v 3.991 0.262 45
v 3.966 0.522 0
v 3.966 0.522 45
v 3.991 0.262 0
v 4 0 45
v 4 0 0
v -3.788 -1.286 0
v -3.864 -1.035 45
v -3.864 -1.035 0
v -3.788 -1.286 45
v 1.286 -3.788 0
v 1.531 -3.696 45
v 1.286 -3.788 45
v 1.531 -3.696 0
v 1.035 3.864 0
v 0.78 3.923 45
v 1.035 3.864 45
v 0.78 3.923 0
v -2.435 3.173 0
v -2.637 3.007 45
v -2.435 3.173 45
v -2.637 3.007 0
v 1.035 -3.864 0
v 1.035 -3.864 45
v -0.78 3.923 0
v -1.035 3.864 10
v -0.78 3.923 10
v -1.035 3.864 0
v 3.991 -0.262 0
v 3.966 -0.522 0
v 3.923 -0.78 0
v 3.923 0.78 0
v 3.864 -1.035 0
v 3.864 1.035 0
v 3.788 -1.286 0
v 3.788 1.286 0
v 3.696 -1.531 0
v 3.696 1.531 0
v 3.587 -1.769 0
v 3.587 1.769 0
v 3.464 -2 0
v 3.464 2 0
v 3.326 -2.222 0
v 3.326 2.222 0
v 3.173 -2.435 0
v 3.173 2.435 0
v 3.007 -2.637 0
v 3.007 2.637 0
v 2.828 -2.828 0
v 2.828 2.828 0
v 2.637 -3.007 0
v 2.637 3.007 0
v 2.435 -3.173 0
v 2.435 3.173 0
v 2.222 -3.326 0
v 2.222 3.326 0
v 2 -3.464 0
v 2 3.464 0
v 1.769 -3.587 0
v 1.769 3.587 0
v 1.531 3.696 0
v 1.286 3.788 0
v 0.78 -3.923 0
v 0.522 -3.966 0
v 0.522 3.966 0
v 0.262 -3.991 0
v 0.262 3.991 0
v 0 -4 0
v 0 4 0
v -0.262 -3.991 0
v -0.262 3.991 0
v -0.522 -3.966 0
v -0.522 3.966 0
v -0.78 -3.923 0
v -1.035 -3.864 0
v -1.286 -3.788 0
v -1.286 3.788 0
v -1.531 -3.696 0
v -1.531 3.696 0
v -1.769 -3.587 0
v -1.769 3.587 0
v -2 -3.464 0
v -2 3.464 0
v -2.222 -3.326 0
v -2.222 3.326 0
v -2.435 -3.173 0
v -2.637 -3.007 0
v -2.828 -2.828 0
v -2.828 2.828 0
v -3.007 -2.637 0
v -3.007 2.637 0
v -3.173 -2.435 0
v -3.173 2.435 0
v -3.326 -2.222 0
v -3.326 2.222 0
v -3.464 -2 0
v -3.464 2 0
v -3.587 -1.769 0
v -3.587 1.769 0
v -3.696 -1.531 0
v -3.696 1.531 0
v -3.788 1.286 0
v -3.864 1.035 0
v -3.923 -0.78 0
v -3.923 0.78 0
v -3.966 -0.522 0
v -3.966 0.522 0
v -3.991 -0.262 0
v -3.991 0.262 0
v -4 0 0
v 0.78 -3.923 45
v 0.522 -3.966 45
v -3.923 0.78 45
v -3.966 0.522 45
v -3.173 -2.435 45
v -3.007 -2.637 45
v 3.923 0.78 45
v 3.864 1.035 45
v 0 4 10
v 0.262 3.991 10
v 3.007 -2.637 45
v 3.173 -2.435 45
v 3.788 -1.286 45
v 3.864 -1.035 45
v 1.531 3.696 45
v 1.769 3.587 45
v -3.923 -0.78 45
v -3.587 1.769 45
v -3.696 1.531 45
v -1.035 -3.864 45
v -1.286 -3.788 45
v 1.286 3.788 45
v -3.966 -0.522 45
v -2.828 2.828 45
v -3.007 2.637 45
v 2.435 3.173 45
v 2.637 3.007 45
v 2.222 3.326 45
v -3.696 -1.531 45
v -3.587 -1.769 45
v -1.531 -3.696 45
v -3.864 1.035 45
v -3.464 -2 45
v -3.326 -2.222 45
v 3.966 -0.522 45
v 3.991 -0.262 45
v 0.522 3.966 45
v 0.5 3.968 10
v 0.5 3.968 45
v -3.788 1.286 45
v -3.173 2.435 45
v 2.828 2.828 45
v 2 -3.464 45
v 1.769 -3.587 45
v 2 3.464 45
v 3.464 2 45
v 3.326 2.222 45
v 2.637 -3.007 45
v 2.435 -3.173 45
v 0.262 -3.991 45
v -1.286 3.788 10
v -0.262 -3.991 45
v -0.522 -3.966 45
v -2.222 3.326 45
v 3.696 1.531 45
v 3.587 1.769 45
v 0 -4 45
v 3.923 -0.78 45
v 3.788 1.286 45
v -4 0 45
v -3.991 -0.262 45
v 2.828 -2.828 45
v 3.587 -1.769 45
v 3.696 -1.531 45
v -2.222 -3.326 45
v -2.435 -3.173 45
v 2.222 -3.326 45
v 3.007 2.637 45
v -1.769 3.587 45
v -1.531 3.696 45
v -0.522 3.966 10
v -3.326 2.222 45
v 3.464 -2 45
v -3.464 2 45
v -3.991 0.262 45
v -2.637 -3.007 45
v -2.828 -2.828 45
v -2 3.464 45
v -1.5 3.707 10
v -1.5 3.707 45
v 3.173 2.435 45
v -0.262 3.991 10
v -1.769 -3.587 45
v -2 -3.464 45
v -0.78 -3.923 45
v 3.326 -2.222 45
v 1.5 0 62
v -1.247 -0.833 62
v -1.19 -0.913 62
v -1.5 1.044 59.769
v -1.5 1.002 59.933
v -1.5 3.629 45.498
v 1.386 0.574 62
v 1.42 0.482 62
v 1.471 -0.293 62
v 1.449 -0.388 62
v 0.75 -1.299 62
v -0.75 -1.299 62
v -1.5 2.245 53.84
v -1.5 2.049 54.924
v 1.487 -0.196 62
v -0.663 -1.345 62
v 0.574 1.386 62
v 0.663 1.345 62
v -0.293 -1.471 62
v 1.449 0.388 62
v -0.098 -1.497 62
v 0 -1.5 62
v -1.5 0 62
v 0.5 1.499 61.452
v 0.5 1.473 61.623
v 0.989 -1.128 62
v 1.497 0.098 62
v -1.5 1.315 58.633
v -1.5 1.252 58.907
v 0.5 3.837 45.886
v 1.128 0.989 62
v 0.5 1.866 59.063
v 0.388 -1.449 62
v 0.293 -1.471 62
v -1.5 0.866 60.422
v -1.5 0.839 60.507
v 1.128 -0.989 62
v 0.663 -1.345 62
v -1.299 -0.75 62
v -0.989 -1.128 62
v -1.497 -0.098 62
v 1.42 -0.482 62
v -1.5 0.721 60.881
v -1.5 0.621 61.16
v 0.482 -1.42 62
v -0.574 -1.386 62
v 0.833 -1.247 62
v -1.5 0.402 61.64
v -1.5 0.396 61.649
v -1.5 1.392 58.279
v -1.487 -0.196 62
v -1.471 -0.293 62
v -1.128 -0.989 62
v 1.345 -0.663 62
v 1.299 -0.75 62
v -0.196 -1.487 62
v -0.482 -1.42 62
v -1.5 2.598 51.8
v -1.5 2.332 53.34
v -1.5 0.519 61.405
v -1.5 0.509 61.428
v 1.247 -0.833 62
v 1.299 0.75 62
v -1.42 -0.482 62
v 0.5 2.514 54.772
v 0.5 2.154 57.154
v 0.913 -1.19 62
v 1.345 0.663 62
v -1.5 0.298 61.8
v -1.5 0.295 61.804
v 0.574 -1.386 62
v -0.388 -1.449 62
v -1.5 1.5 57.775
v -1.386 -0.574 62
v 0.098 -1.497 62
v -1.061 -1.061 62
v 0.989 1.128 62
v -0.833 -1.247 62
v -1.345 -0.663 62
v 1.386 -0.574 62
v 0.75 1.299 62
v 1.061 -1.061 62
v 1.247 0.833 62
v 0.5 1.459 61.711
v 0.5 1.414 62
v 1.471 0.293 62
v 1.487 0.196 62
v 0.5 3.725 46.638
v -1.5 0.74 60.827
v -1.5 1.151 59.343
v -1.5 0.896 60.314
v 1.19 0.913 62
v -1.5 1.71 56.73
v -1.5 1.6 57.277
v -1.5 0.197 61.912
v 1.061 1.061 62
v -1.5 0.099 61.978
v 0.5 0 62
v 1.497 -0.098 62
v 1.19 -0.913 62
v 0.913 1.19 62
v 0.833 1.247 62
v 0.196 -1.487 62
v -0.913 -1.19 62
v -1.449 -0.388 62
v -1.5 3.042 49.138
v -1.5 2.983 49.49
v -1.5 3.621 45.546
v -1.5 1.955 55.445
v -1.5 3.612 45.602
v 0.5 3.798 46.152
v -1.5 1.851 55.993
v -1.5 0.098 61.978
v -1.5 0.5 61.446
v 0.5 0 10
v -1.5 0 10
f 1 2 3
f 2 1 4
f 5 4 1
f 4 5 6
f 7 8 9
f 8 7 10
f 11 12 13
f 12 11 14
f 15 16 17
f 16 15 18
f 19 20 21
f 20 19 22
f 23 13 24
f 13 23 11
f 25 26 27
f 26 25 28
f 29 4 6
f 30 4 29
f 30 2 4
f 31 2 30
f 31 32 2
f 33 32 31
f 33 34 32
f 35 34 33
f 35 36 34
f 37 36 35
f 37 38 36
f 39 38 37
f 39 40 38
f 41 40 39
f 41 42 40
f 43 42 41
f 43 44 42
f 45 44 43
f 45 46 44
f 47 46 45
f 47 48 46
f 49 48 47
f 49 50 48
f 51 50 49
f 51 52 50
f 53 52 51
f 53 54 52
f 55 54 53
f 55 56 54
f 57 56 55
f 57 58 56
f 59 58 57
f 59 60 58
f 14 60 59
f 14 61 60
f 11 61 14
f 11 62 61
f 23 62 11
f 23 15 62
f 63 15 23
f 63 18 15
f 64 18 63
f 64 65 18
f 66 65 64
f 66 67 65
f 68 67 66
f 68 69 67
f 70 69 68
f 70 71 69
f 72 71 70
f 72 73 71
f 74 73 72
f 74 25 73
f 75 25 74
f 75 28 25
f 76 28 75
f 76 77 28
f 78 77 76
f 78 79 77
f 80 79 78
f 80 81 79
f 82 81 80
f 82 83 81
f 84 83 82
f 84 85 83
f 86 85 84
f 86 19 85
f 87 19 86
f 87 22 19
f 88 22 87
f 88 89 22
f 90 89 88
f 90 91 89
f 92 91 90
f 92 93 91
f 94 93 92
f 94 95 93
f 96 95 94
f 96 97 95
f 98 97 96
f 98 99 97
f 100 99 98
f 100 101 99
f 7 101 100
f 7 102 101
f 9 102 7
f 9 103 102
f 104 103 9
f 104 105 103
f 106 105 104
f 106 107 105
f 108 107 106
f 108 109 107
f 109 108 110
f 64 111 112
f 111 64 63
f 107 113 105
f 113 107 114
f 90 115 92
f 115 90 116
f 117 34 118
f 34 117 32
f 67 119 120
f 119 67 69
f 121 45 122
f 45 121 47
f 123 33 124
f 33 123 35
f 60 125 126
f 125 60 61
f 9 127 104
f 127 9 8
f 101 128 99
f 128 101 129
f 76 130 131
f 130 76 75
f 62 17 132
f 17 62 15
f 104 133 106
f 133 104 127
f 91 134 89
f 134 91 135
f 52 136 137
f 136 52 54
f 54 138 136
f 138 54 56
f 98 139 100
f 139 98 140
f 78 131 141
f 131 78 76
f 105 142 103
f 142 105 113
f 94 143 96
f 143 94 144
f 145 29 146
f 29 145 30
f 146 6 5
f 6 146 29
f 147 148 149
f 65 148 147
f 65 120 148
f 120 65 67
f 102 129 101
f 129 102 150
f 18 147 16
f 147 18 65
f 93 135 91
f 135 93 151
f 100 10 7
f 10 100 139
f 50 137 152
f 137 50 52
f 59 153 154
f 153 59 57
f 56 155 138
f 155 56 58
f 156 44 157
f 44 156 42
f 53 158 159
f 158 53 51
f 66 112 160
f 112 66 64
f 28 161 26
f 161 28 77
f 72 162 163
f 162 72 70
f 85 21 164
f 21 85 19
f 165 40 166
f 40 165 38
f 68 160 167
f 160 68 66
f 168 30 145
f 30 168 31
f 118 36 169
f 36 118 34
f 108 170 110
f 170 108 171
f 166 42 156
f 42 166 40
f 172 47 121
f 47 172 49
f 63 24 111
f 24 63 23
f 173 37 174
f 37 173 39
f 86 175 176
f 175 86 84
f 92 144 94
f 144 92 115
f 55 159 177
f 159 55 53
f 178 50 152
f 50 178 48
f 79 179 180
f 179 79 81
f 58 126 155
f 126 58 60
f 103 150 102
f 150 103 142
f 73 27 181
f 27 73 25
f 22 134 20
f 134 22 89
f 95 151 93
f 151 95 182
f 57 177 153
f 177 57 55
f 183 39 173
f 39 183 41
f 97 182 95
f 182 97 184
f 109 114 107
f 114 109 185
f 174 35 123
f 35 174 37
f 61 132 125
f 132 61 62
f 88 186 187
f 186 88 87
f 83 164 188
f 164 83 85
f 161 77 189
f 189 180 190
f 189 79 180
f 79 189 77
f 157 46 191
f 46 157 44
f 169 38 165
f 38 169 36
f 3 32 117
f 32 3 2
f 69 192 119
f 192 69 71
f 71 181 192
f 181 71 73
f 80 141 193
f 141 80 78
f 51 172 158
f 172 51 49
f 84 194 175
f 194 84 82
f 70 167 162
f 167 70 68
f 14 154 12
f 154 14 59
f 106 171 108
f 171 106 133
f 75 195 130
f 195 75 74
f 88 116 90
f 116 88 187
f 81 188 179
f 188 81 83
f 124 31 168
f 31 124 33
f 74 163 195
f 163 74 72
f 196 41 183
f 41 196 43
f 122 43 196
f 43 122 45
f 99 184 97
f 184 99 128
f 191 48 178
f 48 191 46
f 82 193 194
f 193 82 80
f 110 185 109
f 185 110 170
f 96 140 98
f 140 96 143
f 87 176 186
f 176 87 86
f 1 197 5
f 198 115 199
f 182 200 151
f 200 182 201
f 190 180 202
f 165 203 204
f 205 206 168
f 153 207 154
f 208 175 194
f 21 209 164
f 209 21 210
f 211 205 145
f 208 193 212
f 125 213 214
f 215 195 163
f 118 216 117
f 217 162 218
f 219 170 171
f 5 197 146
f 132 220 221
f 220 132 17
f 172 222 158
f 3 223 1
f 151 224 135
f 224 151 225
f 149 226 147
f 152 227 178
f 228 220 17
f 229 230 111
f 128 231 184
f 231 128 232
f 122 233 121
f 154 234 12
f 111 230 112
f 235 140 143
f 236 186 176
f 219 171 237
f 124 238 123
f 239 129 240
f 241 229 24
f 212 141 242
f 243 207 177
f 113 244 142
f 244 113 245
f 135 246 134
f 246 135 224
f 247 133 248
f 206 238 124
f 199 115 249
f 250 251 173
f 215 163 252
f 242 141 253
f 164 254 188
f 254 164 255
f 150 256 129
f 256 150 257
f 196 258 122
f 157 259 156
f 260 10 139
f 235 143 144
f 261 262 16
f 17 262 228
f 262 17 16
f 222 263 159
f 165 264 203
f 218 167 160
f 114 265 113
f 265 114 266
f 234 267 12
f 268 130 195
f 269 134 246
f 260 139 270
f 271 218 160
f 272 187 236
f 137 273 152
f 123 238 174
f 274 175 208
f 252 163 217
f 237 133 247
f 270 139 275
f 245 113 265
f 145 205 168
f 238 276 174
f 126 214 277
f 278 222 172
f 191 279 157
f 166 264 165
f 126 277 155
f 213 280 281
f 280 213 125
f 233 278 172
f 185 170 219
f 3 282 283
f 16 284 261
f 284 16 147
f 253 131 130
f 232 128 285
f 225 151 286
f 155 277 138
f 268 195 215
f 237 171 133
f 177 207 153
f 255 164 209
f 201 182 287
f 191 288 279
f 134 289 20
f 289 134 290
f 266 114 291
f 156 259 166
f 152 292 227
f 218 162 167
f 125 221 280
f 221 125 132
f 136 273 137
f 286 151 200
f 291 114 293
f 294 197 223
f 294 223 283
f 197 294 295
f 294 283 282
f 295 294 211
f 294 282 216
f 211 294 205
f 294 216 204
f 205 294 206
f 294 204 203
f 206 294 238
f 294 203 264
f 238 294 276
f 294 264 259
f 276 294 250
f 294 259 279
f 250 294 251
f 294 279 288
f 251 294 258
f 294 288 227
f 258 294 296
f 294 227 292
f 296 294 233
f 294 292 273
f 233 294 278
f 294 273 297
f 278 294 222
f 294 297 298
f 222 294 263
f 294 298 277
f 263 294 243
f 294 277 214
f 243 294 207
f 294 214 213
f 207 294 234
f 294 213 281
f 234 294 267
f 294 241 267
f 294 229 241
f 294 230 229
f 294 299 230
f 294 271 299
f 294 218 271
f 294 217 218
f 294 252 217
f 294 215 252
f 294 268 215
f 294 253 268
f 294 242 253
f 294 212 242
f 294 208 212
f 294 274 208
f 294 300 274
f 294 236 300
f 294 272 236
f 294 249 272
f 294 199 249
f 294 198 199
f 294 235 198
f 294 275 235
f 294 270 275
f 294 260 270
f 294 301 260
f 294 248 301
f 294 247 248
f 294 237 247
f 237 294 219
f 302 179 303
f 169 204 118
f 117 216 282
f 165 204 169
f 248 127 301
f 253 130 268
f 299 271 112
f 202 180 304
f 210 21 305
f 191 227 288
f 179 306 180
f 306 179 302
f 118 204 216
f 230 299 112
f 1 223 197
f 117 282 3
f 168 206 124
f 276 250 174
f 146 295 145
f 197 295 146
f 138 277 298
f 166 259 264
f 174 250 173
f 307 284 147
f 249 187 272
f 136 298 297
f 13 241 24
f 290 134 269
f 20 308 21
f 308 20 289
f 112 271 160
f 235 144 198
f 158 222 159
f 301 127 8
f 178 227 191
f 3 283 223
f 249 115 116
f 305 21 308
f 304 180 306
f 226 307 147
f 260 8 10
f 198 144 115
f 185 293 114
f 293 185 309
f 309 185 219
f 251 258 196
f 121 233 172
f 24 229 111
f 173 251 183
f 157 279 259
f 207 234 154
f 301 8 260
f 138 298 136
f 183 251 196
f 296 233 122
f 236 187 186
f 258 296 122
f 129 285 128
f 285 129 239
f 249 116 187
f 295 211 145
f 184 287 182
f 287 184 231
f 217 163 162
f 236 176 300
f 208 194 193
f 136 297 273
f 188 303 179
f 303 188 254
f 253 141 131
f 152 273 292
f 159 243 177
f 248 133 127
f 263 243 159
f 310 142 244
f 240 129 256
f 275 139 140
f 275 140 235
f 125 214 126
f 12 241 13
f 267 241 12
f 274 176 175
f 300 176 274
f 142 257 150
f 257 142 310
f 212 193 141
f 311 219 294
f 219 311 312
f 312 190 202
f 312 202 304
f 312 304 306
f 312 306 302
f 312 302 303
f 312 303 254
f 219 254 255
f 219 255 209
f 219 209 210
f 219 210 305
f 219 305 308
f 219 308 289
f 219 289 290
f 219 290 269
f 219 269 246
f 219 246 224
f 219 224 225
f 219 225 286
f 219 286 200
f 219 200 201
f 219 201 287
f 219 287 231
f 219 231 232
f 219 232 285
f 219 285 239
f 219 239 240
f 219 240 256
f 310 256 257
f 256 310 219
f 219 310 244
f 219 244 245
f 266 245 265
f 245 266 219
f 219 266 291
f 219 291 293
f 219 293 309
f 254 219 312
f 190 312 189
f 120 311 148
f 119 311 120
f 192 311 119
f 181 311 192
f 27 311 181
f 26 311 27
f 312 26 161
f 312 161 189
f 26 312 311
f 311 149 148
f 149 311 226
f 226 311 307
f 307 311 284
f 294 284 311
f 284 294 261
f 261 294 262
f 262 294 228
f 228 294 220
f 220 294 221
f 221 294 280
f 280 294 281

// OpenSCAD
// Pestle for grinding tissue inside a 1.5 mL microcentrifuge tube
// Print orientation: standing upright on the bed (z = 0), centred on the origin in X and Y.
// Units: millimetres.

// ---------------- Parameters ----------------
handle_d      = 8;    // handle diameter (also cone base diameter)
handle_h      = 45;   // handle height (z = 0 to z = 45)
cone_d        = 3;    // cone tip diameter (at z = 62)
cone_top_z    = 62;   // z where the cone meets the rounded tip
tip_d         = 3;    // rounded tip diameter (sphere)
tip_z         = 62;   // sphere centre height (z = cone_top_z)
groove_count  = 4;    // number of circumferential grooves on the handle
groove_w      = 2;    // groove width (in Z)
groove_depth  = 1;    // groove depth (in radial thickness / X)
groove_z      = [10, 15, 20, 25]; // groove centre heights
eps           = 0.5;  // overshoot for clean boolean cuts
$fn           = 96;   // curve resolution

// ---------------- Model ----------------
difference() {
    union() {
        // (1) Cylindrical handle
        cylinder(d = handle_d, h = handle_h);

        // (2) Tapering cone: 8 mm at z = 45 to 3 mm at z = 62
        translate([0, 0, handle_h])
            cylinder(d1 = handle_d, d2 = cone_d, h = cone_top_z - handle_h);

        // (3) Rounded tip: 3 mm diameter sphere centred at z = 62
        translate([0, 0, tip_z - tip_d / 2])
            sphere(d = tip_d);
    }

    // Grip grooves, cut fully through the handle wall
    // (the cylinder above runs from z = 0 to z = 45, so the cuts stop at the top face)
    for (g = [0 : groove_count - 1]) {
        rotate([0, 0, groove_z[g] < handle_h ? 90 : 0])
            translate([0, -eps, groove_z[g]])
                cube([handle_d / 2 + eps, groove_w, handle_h + 1]);
    }
}
